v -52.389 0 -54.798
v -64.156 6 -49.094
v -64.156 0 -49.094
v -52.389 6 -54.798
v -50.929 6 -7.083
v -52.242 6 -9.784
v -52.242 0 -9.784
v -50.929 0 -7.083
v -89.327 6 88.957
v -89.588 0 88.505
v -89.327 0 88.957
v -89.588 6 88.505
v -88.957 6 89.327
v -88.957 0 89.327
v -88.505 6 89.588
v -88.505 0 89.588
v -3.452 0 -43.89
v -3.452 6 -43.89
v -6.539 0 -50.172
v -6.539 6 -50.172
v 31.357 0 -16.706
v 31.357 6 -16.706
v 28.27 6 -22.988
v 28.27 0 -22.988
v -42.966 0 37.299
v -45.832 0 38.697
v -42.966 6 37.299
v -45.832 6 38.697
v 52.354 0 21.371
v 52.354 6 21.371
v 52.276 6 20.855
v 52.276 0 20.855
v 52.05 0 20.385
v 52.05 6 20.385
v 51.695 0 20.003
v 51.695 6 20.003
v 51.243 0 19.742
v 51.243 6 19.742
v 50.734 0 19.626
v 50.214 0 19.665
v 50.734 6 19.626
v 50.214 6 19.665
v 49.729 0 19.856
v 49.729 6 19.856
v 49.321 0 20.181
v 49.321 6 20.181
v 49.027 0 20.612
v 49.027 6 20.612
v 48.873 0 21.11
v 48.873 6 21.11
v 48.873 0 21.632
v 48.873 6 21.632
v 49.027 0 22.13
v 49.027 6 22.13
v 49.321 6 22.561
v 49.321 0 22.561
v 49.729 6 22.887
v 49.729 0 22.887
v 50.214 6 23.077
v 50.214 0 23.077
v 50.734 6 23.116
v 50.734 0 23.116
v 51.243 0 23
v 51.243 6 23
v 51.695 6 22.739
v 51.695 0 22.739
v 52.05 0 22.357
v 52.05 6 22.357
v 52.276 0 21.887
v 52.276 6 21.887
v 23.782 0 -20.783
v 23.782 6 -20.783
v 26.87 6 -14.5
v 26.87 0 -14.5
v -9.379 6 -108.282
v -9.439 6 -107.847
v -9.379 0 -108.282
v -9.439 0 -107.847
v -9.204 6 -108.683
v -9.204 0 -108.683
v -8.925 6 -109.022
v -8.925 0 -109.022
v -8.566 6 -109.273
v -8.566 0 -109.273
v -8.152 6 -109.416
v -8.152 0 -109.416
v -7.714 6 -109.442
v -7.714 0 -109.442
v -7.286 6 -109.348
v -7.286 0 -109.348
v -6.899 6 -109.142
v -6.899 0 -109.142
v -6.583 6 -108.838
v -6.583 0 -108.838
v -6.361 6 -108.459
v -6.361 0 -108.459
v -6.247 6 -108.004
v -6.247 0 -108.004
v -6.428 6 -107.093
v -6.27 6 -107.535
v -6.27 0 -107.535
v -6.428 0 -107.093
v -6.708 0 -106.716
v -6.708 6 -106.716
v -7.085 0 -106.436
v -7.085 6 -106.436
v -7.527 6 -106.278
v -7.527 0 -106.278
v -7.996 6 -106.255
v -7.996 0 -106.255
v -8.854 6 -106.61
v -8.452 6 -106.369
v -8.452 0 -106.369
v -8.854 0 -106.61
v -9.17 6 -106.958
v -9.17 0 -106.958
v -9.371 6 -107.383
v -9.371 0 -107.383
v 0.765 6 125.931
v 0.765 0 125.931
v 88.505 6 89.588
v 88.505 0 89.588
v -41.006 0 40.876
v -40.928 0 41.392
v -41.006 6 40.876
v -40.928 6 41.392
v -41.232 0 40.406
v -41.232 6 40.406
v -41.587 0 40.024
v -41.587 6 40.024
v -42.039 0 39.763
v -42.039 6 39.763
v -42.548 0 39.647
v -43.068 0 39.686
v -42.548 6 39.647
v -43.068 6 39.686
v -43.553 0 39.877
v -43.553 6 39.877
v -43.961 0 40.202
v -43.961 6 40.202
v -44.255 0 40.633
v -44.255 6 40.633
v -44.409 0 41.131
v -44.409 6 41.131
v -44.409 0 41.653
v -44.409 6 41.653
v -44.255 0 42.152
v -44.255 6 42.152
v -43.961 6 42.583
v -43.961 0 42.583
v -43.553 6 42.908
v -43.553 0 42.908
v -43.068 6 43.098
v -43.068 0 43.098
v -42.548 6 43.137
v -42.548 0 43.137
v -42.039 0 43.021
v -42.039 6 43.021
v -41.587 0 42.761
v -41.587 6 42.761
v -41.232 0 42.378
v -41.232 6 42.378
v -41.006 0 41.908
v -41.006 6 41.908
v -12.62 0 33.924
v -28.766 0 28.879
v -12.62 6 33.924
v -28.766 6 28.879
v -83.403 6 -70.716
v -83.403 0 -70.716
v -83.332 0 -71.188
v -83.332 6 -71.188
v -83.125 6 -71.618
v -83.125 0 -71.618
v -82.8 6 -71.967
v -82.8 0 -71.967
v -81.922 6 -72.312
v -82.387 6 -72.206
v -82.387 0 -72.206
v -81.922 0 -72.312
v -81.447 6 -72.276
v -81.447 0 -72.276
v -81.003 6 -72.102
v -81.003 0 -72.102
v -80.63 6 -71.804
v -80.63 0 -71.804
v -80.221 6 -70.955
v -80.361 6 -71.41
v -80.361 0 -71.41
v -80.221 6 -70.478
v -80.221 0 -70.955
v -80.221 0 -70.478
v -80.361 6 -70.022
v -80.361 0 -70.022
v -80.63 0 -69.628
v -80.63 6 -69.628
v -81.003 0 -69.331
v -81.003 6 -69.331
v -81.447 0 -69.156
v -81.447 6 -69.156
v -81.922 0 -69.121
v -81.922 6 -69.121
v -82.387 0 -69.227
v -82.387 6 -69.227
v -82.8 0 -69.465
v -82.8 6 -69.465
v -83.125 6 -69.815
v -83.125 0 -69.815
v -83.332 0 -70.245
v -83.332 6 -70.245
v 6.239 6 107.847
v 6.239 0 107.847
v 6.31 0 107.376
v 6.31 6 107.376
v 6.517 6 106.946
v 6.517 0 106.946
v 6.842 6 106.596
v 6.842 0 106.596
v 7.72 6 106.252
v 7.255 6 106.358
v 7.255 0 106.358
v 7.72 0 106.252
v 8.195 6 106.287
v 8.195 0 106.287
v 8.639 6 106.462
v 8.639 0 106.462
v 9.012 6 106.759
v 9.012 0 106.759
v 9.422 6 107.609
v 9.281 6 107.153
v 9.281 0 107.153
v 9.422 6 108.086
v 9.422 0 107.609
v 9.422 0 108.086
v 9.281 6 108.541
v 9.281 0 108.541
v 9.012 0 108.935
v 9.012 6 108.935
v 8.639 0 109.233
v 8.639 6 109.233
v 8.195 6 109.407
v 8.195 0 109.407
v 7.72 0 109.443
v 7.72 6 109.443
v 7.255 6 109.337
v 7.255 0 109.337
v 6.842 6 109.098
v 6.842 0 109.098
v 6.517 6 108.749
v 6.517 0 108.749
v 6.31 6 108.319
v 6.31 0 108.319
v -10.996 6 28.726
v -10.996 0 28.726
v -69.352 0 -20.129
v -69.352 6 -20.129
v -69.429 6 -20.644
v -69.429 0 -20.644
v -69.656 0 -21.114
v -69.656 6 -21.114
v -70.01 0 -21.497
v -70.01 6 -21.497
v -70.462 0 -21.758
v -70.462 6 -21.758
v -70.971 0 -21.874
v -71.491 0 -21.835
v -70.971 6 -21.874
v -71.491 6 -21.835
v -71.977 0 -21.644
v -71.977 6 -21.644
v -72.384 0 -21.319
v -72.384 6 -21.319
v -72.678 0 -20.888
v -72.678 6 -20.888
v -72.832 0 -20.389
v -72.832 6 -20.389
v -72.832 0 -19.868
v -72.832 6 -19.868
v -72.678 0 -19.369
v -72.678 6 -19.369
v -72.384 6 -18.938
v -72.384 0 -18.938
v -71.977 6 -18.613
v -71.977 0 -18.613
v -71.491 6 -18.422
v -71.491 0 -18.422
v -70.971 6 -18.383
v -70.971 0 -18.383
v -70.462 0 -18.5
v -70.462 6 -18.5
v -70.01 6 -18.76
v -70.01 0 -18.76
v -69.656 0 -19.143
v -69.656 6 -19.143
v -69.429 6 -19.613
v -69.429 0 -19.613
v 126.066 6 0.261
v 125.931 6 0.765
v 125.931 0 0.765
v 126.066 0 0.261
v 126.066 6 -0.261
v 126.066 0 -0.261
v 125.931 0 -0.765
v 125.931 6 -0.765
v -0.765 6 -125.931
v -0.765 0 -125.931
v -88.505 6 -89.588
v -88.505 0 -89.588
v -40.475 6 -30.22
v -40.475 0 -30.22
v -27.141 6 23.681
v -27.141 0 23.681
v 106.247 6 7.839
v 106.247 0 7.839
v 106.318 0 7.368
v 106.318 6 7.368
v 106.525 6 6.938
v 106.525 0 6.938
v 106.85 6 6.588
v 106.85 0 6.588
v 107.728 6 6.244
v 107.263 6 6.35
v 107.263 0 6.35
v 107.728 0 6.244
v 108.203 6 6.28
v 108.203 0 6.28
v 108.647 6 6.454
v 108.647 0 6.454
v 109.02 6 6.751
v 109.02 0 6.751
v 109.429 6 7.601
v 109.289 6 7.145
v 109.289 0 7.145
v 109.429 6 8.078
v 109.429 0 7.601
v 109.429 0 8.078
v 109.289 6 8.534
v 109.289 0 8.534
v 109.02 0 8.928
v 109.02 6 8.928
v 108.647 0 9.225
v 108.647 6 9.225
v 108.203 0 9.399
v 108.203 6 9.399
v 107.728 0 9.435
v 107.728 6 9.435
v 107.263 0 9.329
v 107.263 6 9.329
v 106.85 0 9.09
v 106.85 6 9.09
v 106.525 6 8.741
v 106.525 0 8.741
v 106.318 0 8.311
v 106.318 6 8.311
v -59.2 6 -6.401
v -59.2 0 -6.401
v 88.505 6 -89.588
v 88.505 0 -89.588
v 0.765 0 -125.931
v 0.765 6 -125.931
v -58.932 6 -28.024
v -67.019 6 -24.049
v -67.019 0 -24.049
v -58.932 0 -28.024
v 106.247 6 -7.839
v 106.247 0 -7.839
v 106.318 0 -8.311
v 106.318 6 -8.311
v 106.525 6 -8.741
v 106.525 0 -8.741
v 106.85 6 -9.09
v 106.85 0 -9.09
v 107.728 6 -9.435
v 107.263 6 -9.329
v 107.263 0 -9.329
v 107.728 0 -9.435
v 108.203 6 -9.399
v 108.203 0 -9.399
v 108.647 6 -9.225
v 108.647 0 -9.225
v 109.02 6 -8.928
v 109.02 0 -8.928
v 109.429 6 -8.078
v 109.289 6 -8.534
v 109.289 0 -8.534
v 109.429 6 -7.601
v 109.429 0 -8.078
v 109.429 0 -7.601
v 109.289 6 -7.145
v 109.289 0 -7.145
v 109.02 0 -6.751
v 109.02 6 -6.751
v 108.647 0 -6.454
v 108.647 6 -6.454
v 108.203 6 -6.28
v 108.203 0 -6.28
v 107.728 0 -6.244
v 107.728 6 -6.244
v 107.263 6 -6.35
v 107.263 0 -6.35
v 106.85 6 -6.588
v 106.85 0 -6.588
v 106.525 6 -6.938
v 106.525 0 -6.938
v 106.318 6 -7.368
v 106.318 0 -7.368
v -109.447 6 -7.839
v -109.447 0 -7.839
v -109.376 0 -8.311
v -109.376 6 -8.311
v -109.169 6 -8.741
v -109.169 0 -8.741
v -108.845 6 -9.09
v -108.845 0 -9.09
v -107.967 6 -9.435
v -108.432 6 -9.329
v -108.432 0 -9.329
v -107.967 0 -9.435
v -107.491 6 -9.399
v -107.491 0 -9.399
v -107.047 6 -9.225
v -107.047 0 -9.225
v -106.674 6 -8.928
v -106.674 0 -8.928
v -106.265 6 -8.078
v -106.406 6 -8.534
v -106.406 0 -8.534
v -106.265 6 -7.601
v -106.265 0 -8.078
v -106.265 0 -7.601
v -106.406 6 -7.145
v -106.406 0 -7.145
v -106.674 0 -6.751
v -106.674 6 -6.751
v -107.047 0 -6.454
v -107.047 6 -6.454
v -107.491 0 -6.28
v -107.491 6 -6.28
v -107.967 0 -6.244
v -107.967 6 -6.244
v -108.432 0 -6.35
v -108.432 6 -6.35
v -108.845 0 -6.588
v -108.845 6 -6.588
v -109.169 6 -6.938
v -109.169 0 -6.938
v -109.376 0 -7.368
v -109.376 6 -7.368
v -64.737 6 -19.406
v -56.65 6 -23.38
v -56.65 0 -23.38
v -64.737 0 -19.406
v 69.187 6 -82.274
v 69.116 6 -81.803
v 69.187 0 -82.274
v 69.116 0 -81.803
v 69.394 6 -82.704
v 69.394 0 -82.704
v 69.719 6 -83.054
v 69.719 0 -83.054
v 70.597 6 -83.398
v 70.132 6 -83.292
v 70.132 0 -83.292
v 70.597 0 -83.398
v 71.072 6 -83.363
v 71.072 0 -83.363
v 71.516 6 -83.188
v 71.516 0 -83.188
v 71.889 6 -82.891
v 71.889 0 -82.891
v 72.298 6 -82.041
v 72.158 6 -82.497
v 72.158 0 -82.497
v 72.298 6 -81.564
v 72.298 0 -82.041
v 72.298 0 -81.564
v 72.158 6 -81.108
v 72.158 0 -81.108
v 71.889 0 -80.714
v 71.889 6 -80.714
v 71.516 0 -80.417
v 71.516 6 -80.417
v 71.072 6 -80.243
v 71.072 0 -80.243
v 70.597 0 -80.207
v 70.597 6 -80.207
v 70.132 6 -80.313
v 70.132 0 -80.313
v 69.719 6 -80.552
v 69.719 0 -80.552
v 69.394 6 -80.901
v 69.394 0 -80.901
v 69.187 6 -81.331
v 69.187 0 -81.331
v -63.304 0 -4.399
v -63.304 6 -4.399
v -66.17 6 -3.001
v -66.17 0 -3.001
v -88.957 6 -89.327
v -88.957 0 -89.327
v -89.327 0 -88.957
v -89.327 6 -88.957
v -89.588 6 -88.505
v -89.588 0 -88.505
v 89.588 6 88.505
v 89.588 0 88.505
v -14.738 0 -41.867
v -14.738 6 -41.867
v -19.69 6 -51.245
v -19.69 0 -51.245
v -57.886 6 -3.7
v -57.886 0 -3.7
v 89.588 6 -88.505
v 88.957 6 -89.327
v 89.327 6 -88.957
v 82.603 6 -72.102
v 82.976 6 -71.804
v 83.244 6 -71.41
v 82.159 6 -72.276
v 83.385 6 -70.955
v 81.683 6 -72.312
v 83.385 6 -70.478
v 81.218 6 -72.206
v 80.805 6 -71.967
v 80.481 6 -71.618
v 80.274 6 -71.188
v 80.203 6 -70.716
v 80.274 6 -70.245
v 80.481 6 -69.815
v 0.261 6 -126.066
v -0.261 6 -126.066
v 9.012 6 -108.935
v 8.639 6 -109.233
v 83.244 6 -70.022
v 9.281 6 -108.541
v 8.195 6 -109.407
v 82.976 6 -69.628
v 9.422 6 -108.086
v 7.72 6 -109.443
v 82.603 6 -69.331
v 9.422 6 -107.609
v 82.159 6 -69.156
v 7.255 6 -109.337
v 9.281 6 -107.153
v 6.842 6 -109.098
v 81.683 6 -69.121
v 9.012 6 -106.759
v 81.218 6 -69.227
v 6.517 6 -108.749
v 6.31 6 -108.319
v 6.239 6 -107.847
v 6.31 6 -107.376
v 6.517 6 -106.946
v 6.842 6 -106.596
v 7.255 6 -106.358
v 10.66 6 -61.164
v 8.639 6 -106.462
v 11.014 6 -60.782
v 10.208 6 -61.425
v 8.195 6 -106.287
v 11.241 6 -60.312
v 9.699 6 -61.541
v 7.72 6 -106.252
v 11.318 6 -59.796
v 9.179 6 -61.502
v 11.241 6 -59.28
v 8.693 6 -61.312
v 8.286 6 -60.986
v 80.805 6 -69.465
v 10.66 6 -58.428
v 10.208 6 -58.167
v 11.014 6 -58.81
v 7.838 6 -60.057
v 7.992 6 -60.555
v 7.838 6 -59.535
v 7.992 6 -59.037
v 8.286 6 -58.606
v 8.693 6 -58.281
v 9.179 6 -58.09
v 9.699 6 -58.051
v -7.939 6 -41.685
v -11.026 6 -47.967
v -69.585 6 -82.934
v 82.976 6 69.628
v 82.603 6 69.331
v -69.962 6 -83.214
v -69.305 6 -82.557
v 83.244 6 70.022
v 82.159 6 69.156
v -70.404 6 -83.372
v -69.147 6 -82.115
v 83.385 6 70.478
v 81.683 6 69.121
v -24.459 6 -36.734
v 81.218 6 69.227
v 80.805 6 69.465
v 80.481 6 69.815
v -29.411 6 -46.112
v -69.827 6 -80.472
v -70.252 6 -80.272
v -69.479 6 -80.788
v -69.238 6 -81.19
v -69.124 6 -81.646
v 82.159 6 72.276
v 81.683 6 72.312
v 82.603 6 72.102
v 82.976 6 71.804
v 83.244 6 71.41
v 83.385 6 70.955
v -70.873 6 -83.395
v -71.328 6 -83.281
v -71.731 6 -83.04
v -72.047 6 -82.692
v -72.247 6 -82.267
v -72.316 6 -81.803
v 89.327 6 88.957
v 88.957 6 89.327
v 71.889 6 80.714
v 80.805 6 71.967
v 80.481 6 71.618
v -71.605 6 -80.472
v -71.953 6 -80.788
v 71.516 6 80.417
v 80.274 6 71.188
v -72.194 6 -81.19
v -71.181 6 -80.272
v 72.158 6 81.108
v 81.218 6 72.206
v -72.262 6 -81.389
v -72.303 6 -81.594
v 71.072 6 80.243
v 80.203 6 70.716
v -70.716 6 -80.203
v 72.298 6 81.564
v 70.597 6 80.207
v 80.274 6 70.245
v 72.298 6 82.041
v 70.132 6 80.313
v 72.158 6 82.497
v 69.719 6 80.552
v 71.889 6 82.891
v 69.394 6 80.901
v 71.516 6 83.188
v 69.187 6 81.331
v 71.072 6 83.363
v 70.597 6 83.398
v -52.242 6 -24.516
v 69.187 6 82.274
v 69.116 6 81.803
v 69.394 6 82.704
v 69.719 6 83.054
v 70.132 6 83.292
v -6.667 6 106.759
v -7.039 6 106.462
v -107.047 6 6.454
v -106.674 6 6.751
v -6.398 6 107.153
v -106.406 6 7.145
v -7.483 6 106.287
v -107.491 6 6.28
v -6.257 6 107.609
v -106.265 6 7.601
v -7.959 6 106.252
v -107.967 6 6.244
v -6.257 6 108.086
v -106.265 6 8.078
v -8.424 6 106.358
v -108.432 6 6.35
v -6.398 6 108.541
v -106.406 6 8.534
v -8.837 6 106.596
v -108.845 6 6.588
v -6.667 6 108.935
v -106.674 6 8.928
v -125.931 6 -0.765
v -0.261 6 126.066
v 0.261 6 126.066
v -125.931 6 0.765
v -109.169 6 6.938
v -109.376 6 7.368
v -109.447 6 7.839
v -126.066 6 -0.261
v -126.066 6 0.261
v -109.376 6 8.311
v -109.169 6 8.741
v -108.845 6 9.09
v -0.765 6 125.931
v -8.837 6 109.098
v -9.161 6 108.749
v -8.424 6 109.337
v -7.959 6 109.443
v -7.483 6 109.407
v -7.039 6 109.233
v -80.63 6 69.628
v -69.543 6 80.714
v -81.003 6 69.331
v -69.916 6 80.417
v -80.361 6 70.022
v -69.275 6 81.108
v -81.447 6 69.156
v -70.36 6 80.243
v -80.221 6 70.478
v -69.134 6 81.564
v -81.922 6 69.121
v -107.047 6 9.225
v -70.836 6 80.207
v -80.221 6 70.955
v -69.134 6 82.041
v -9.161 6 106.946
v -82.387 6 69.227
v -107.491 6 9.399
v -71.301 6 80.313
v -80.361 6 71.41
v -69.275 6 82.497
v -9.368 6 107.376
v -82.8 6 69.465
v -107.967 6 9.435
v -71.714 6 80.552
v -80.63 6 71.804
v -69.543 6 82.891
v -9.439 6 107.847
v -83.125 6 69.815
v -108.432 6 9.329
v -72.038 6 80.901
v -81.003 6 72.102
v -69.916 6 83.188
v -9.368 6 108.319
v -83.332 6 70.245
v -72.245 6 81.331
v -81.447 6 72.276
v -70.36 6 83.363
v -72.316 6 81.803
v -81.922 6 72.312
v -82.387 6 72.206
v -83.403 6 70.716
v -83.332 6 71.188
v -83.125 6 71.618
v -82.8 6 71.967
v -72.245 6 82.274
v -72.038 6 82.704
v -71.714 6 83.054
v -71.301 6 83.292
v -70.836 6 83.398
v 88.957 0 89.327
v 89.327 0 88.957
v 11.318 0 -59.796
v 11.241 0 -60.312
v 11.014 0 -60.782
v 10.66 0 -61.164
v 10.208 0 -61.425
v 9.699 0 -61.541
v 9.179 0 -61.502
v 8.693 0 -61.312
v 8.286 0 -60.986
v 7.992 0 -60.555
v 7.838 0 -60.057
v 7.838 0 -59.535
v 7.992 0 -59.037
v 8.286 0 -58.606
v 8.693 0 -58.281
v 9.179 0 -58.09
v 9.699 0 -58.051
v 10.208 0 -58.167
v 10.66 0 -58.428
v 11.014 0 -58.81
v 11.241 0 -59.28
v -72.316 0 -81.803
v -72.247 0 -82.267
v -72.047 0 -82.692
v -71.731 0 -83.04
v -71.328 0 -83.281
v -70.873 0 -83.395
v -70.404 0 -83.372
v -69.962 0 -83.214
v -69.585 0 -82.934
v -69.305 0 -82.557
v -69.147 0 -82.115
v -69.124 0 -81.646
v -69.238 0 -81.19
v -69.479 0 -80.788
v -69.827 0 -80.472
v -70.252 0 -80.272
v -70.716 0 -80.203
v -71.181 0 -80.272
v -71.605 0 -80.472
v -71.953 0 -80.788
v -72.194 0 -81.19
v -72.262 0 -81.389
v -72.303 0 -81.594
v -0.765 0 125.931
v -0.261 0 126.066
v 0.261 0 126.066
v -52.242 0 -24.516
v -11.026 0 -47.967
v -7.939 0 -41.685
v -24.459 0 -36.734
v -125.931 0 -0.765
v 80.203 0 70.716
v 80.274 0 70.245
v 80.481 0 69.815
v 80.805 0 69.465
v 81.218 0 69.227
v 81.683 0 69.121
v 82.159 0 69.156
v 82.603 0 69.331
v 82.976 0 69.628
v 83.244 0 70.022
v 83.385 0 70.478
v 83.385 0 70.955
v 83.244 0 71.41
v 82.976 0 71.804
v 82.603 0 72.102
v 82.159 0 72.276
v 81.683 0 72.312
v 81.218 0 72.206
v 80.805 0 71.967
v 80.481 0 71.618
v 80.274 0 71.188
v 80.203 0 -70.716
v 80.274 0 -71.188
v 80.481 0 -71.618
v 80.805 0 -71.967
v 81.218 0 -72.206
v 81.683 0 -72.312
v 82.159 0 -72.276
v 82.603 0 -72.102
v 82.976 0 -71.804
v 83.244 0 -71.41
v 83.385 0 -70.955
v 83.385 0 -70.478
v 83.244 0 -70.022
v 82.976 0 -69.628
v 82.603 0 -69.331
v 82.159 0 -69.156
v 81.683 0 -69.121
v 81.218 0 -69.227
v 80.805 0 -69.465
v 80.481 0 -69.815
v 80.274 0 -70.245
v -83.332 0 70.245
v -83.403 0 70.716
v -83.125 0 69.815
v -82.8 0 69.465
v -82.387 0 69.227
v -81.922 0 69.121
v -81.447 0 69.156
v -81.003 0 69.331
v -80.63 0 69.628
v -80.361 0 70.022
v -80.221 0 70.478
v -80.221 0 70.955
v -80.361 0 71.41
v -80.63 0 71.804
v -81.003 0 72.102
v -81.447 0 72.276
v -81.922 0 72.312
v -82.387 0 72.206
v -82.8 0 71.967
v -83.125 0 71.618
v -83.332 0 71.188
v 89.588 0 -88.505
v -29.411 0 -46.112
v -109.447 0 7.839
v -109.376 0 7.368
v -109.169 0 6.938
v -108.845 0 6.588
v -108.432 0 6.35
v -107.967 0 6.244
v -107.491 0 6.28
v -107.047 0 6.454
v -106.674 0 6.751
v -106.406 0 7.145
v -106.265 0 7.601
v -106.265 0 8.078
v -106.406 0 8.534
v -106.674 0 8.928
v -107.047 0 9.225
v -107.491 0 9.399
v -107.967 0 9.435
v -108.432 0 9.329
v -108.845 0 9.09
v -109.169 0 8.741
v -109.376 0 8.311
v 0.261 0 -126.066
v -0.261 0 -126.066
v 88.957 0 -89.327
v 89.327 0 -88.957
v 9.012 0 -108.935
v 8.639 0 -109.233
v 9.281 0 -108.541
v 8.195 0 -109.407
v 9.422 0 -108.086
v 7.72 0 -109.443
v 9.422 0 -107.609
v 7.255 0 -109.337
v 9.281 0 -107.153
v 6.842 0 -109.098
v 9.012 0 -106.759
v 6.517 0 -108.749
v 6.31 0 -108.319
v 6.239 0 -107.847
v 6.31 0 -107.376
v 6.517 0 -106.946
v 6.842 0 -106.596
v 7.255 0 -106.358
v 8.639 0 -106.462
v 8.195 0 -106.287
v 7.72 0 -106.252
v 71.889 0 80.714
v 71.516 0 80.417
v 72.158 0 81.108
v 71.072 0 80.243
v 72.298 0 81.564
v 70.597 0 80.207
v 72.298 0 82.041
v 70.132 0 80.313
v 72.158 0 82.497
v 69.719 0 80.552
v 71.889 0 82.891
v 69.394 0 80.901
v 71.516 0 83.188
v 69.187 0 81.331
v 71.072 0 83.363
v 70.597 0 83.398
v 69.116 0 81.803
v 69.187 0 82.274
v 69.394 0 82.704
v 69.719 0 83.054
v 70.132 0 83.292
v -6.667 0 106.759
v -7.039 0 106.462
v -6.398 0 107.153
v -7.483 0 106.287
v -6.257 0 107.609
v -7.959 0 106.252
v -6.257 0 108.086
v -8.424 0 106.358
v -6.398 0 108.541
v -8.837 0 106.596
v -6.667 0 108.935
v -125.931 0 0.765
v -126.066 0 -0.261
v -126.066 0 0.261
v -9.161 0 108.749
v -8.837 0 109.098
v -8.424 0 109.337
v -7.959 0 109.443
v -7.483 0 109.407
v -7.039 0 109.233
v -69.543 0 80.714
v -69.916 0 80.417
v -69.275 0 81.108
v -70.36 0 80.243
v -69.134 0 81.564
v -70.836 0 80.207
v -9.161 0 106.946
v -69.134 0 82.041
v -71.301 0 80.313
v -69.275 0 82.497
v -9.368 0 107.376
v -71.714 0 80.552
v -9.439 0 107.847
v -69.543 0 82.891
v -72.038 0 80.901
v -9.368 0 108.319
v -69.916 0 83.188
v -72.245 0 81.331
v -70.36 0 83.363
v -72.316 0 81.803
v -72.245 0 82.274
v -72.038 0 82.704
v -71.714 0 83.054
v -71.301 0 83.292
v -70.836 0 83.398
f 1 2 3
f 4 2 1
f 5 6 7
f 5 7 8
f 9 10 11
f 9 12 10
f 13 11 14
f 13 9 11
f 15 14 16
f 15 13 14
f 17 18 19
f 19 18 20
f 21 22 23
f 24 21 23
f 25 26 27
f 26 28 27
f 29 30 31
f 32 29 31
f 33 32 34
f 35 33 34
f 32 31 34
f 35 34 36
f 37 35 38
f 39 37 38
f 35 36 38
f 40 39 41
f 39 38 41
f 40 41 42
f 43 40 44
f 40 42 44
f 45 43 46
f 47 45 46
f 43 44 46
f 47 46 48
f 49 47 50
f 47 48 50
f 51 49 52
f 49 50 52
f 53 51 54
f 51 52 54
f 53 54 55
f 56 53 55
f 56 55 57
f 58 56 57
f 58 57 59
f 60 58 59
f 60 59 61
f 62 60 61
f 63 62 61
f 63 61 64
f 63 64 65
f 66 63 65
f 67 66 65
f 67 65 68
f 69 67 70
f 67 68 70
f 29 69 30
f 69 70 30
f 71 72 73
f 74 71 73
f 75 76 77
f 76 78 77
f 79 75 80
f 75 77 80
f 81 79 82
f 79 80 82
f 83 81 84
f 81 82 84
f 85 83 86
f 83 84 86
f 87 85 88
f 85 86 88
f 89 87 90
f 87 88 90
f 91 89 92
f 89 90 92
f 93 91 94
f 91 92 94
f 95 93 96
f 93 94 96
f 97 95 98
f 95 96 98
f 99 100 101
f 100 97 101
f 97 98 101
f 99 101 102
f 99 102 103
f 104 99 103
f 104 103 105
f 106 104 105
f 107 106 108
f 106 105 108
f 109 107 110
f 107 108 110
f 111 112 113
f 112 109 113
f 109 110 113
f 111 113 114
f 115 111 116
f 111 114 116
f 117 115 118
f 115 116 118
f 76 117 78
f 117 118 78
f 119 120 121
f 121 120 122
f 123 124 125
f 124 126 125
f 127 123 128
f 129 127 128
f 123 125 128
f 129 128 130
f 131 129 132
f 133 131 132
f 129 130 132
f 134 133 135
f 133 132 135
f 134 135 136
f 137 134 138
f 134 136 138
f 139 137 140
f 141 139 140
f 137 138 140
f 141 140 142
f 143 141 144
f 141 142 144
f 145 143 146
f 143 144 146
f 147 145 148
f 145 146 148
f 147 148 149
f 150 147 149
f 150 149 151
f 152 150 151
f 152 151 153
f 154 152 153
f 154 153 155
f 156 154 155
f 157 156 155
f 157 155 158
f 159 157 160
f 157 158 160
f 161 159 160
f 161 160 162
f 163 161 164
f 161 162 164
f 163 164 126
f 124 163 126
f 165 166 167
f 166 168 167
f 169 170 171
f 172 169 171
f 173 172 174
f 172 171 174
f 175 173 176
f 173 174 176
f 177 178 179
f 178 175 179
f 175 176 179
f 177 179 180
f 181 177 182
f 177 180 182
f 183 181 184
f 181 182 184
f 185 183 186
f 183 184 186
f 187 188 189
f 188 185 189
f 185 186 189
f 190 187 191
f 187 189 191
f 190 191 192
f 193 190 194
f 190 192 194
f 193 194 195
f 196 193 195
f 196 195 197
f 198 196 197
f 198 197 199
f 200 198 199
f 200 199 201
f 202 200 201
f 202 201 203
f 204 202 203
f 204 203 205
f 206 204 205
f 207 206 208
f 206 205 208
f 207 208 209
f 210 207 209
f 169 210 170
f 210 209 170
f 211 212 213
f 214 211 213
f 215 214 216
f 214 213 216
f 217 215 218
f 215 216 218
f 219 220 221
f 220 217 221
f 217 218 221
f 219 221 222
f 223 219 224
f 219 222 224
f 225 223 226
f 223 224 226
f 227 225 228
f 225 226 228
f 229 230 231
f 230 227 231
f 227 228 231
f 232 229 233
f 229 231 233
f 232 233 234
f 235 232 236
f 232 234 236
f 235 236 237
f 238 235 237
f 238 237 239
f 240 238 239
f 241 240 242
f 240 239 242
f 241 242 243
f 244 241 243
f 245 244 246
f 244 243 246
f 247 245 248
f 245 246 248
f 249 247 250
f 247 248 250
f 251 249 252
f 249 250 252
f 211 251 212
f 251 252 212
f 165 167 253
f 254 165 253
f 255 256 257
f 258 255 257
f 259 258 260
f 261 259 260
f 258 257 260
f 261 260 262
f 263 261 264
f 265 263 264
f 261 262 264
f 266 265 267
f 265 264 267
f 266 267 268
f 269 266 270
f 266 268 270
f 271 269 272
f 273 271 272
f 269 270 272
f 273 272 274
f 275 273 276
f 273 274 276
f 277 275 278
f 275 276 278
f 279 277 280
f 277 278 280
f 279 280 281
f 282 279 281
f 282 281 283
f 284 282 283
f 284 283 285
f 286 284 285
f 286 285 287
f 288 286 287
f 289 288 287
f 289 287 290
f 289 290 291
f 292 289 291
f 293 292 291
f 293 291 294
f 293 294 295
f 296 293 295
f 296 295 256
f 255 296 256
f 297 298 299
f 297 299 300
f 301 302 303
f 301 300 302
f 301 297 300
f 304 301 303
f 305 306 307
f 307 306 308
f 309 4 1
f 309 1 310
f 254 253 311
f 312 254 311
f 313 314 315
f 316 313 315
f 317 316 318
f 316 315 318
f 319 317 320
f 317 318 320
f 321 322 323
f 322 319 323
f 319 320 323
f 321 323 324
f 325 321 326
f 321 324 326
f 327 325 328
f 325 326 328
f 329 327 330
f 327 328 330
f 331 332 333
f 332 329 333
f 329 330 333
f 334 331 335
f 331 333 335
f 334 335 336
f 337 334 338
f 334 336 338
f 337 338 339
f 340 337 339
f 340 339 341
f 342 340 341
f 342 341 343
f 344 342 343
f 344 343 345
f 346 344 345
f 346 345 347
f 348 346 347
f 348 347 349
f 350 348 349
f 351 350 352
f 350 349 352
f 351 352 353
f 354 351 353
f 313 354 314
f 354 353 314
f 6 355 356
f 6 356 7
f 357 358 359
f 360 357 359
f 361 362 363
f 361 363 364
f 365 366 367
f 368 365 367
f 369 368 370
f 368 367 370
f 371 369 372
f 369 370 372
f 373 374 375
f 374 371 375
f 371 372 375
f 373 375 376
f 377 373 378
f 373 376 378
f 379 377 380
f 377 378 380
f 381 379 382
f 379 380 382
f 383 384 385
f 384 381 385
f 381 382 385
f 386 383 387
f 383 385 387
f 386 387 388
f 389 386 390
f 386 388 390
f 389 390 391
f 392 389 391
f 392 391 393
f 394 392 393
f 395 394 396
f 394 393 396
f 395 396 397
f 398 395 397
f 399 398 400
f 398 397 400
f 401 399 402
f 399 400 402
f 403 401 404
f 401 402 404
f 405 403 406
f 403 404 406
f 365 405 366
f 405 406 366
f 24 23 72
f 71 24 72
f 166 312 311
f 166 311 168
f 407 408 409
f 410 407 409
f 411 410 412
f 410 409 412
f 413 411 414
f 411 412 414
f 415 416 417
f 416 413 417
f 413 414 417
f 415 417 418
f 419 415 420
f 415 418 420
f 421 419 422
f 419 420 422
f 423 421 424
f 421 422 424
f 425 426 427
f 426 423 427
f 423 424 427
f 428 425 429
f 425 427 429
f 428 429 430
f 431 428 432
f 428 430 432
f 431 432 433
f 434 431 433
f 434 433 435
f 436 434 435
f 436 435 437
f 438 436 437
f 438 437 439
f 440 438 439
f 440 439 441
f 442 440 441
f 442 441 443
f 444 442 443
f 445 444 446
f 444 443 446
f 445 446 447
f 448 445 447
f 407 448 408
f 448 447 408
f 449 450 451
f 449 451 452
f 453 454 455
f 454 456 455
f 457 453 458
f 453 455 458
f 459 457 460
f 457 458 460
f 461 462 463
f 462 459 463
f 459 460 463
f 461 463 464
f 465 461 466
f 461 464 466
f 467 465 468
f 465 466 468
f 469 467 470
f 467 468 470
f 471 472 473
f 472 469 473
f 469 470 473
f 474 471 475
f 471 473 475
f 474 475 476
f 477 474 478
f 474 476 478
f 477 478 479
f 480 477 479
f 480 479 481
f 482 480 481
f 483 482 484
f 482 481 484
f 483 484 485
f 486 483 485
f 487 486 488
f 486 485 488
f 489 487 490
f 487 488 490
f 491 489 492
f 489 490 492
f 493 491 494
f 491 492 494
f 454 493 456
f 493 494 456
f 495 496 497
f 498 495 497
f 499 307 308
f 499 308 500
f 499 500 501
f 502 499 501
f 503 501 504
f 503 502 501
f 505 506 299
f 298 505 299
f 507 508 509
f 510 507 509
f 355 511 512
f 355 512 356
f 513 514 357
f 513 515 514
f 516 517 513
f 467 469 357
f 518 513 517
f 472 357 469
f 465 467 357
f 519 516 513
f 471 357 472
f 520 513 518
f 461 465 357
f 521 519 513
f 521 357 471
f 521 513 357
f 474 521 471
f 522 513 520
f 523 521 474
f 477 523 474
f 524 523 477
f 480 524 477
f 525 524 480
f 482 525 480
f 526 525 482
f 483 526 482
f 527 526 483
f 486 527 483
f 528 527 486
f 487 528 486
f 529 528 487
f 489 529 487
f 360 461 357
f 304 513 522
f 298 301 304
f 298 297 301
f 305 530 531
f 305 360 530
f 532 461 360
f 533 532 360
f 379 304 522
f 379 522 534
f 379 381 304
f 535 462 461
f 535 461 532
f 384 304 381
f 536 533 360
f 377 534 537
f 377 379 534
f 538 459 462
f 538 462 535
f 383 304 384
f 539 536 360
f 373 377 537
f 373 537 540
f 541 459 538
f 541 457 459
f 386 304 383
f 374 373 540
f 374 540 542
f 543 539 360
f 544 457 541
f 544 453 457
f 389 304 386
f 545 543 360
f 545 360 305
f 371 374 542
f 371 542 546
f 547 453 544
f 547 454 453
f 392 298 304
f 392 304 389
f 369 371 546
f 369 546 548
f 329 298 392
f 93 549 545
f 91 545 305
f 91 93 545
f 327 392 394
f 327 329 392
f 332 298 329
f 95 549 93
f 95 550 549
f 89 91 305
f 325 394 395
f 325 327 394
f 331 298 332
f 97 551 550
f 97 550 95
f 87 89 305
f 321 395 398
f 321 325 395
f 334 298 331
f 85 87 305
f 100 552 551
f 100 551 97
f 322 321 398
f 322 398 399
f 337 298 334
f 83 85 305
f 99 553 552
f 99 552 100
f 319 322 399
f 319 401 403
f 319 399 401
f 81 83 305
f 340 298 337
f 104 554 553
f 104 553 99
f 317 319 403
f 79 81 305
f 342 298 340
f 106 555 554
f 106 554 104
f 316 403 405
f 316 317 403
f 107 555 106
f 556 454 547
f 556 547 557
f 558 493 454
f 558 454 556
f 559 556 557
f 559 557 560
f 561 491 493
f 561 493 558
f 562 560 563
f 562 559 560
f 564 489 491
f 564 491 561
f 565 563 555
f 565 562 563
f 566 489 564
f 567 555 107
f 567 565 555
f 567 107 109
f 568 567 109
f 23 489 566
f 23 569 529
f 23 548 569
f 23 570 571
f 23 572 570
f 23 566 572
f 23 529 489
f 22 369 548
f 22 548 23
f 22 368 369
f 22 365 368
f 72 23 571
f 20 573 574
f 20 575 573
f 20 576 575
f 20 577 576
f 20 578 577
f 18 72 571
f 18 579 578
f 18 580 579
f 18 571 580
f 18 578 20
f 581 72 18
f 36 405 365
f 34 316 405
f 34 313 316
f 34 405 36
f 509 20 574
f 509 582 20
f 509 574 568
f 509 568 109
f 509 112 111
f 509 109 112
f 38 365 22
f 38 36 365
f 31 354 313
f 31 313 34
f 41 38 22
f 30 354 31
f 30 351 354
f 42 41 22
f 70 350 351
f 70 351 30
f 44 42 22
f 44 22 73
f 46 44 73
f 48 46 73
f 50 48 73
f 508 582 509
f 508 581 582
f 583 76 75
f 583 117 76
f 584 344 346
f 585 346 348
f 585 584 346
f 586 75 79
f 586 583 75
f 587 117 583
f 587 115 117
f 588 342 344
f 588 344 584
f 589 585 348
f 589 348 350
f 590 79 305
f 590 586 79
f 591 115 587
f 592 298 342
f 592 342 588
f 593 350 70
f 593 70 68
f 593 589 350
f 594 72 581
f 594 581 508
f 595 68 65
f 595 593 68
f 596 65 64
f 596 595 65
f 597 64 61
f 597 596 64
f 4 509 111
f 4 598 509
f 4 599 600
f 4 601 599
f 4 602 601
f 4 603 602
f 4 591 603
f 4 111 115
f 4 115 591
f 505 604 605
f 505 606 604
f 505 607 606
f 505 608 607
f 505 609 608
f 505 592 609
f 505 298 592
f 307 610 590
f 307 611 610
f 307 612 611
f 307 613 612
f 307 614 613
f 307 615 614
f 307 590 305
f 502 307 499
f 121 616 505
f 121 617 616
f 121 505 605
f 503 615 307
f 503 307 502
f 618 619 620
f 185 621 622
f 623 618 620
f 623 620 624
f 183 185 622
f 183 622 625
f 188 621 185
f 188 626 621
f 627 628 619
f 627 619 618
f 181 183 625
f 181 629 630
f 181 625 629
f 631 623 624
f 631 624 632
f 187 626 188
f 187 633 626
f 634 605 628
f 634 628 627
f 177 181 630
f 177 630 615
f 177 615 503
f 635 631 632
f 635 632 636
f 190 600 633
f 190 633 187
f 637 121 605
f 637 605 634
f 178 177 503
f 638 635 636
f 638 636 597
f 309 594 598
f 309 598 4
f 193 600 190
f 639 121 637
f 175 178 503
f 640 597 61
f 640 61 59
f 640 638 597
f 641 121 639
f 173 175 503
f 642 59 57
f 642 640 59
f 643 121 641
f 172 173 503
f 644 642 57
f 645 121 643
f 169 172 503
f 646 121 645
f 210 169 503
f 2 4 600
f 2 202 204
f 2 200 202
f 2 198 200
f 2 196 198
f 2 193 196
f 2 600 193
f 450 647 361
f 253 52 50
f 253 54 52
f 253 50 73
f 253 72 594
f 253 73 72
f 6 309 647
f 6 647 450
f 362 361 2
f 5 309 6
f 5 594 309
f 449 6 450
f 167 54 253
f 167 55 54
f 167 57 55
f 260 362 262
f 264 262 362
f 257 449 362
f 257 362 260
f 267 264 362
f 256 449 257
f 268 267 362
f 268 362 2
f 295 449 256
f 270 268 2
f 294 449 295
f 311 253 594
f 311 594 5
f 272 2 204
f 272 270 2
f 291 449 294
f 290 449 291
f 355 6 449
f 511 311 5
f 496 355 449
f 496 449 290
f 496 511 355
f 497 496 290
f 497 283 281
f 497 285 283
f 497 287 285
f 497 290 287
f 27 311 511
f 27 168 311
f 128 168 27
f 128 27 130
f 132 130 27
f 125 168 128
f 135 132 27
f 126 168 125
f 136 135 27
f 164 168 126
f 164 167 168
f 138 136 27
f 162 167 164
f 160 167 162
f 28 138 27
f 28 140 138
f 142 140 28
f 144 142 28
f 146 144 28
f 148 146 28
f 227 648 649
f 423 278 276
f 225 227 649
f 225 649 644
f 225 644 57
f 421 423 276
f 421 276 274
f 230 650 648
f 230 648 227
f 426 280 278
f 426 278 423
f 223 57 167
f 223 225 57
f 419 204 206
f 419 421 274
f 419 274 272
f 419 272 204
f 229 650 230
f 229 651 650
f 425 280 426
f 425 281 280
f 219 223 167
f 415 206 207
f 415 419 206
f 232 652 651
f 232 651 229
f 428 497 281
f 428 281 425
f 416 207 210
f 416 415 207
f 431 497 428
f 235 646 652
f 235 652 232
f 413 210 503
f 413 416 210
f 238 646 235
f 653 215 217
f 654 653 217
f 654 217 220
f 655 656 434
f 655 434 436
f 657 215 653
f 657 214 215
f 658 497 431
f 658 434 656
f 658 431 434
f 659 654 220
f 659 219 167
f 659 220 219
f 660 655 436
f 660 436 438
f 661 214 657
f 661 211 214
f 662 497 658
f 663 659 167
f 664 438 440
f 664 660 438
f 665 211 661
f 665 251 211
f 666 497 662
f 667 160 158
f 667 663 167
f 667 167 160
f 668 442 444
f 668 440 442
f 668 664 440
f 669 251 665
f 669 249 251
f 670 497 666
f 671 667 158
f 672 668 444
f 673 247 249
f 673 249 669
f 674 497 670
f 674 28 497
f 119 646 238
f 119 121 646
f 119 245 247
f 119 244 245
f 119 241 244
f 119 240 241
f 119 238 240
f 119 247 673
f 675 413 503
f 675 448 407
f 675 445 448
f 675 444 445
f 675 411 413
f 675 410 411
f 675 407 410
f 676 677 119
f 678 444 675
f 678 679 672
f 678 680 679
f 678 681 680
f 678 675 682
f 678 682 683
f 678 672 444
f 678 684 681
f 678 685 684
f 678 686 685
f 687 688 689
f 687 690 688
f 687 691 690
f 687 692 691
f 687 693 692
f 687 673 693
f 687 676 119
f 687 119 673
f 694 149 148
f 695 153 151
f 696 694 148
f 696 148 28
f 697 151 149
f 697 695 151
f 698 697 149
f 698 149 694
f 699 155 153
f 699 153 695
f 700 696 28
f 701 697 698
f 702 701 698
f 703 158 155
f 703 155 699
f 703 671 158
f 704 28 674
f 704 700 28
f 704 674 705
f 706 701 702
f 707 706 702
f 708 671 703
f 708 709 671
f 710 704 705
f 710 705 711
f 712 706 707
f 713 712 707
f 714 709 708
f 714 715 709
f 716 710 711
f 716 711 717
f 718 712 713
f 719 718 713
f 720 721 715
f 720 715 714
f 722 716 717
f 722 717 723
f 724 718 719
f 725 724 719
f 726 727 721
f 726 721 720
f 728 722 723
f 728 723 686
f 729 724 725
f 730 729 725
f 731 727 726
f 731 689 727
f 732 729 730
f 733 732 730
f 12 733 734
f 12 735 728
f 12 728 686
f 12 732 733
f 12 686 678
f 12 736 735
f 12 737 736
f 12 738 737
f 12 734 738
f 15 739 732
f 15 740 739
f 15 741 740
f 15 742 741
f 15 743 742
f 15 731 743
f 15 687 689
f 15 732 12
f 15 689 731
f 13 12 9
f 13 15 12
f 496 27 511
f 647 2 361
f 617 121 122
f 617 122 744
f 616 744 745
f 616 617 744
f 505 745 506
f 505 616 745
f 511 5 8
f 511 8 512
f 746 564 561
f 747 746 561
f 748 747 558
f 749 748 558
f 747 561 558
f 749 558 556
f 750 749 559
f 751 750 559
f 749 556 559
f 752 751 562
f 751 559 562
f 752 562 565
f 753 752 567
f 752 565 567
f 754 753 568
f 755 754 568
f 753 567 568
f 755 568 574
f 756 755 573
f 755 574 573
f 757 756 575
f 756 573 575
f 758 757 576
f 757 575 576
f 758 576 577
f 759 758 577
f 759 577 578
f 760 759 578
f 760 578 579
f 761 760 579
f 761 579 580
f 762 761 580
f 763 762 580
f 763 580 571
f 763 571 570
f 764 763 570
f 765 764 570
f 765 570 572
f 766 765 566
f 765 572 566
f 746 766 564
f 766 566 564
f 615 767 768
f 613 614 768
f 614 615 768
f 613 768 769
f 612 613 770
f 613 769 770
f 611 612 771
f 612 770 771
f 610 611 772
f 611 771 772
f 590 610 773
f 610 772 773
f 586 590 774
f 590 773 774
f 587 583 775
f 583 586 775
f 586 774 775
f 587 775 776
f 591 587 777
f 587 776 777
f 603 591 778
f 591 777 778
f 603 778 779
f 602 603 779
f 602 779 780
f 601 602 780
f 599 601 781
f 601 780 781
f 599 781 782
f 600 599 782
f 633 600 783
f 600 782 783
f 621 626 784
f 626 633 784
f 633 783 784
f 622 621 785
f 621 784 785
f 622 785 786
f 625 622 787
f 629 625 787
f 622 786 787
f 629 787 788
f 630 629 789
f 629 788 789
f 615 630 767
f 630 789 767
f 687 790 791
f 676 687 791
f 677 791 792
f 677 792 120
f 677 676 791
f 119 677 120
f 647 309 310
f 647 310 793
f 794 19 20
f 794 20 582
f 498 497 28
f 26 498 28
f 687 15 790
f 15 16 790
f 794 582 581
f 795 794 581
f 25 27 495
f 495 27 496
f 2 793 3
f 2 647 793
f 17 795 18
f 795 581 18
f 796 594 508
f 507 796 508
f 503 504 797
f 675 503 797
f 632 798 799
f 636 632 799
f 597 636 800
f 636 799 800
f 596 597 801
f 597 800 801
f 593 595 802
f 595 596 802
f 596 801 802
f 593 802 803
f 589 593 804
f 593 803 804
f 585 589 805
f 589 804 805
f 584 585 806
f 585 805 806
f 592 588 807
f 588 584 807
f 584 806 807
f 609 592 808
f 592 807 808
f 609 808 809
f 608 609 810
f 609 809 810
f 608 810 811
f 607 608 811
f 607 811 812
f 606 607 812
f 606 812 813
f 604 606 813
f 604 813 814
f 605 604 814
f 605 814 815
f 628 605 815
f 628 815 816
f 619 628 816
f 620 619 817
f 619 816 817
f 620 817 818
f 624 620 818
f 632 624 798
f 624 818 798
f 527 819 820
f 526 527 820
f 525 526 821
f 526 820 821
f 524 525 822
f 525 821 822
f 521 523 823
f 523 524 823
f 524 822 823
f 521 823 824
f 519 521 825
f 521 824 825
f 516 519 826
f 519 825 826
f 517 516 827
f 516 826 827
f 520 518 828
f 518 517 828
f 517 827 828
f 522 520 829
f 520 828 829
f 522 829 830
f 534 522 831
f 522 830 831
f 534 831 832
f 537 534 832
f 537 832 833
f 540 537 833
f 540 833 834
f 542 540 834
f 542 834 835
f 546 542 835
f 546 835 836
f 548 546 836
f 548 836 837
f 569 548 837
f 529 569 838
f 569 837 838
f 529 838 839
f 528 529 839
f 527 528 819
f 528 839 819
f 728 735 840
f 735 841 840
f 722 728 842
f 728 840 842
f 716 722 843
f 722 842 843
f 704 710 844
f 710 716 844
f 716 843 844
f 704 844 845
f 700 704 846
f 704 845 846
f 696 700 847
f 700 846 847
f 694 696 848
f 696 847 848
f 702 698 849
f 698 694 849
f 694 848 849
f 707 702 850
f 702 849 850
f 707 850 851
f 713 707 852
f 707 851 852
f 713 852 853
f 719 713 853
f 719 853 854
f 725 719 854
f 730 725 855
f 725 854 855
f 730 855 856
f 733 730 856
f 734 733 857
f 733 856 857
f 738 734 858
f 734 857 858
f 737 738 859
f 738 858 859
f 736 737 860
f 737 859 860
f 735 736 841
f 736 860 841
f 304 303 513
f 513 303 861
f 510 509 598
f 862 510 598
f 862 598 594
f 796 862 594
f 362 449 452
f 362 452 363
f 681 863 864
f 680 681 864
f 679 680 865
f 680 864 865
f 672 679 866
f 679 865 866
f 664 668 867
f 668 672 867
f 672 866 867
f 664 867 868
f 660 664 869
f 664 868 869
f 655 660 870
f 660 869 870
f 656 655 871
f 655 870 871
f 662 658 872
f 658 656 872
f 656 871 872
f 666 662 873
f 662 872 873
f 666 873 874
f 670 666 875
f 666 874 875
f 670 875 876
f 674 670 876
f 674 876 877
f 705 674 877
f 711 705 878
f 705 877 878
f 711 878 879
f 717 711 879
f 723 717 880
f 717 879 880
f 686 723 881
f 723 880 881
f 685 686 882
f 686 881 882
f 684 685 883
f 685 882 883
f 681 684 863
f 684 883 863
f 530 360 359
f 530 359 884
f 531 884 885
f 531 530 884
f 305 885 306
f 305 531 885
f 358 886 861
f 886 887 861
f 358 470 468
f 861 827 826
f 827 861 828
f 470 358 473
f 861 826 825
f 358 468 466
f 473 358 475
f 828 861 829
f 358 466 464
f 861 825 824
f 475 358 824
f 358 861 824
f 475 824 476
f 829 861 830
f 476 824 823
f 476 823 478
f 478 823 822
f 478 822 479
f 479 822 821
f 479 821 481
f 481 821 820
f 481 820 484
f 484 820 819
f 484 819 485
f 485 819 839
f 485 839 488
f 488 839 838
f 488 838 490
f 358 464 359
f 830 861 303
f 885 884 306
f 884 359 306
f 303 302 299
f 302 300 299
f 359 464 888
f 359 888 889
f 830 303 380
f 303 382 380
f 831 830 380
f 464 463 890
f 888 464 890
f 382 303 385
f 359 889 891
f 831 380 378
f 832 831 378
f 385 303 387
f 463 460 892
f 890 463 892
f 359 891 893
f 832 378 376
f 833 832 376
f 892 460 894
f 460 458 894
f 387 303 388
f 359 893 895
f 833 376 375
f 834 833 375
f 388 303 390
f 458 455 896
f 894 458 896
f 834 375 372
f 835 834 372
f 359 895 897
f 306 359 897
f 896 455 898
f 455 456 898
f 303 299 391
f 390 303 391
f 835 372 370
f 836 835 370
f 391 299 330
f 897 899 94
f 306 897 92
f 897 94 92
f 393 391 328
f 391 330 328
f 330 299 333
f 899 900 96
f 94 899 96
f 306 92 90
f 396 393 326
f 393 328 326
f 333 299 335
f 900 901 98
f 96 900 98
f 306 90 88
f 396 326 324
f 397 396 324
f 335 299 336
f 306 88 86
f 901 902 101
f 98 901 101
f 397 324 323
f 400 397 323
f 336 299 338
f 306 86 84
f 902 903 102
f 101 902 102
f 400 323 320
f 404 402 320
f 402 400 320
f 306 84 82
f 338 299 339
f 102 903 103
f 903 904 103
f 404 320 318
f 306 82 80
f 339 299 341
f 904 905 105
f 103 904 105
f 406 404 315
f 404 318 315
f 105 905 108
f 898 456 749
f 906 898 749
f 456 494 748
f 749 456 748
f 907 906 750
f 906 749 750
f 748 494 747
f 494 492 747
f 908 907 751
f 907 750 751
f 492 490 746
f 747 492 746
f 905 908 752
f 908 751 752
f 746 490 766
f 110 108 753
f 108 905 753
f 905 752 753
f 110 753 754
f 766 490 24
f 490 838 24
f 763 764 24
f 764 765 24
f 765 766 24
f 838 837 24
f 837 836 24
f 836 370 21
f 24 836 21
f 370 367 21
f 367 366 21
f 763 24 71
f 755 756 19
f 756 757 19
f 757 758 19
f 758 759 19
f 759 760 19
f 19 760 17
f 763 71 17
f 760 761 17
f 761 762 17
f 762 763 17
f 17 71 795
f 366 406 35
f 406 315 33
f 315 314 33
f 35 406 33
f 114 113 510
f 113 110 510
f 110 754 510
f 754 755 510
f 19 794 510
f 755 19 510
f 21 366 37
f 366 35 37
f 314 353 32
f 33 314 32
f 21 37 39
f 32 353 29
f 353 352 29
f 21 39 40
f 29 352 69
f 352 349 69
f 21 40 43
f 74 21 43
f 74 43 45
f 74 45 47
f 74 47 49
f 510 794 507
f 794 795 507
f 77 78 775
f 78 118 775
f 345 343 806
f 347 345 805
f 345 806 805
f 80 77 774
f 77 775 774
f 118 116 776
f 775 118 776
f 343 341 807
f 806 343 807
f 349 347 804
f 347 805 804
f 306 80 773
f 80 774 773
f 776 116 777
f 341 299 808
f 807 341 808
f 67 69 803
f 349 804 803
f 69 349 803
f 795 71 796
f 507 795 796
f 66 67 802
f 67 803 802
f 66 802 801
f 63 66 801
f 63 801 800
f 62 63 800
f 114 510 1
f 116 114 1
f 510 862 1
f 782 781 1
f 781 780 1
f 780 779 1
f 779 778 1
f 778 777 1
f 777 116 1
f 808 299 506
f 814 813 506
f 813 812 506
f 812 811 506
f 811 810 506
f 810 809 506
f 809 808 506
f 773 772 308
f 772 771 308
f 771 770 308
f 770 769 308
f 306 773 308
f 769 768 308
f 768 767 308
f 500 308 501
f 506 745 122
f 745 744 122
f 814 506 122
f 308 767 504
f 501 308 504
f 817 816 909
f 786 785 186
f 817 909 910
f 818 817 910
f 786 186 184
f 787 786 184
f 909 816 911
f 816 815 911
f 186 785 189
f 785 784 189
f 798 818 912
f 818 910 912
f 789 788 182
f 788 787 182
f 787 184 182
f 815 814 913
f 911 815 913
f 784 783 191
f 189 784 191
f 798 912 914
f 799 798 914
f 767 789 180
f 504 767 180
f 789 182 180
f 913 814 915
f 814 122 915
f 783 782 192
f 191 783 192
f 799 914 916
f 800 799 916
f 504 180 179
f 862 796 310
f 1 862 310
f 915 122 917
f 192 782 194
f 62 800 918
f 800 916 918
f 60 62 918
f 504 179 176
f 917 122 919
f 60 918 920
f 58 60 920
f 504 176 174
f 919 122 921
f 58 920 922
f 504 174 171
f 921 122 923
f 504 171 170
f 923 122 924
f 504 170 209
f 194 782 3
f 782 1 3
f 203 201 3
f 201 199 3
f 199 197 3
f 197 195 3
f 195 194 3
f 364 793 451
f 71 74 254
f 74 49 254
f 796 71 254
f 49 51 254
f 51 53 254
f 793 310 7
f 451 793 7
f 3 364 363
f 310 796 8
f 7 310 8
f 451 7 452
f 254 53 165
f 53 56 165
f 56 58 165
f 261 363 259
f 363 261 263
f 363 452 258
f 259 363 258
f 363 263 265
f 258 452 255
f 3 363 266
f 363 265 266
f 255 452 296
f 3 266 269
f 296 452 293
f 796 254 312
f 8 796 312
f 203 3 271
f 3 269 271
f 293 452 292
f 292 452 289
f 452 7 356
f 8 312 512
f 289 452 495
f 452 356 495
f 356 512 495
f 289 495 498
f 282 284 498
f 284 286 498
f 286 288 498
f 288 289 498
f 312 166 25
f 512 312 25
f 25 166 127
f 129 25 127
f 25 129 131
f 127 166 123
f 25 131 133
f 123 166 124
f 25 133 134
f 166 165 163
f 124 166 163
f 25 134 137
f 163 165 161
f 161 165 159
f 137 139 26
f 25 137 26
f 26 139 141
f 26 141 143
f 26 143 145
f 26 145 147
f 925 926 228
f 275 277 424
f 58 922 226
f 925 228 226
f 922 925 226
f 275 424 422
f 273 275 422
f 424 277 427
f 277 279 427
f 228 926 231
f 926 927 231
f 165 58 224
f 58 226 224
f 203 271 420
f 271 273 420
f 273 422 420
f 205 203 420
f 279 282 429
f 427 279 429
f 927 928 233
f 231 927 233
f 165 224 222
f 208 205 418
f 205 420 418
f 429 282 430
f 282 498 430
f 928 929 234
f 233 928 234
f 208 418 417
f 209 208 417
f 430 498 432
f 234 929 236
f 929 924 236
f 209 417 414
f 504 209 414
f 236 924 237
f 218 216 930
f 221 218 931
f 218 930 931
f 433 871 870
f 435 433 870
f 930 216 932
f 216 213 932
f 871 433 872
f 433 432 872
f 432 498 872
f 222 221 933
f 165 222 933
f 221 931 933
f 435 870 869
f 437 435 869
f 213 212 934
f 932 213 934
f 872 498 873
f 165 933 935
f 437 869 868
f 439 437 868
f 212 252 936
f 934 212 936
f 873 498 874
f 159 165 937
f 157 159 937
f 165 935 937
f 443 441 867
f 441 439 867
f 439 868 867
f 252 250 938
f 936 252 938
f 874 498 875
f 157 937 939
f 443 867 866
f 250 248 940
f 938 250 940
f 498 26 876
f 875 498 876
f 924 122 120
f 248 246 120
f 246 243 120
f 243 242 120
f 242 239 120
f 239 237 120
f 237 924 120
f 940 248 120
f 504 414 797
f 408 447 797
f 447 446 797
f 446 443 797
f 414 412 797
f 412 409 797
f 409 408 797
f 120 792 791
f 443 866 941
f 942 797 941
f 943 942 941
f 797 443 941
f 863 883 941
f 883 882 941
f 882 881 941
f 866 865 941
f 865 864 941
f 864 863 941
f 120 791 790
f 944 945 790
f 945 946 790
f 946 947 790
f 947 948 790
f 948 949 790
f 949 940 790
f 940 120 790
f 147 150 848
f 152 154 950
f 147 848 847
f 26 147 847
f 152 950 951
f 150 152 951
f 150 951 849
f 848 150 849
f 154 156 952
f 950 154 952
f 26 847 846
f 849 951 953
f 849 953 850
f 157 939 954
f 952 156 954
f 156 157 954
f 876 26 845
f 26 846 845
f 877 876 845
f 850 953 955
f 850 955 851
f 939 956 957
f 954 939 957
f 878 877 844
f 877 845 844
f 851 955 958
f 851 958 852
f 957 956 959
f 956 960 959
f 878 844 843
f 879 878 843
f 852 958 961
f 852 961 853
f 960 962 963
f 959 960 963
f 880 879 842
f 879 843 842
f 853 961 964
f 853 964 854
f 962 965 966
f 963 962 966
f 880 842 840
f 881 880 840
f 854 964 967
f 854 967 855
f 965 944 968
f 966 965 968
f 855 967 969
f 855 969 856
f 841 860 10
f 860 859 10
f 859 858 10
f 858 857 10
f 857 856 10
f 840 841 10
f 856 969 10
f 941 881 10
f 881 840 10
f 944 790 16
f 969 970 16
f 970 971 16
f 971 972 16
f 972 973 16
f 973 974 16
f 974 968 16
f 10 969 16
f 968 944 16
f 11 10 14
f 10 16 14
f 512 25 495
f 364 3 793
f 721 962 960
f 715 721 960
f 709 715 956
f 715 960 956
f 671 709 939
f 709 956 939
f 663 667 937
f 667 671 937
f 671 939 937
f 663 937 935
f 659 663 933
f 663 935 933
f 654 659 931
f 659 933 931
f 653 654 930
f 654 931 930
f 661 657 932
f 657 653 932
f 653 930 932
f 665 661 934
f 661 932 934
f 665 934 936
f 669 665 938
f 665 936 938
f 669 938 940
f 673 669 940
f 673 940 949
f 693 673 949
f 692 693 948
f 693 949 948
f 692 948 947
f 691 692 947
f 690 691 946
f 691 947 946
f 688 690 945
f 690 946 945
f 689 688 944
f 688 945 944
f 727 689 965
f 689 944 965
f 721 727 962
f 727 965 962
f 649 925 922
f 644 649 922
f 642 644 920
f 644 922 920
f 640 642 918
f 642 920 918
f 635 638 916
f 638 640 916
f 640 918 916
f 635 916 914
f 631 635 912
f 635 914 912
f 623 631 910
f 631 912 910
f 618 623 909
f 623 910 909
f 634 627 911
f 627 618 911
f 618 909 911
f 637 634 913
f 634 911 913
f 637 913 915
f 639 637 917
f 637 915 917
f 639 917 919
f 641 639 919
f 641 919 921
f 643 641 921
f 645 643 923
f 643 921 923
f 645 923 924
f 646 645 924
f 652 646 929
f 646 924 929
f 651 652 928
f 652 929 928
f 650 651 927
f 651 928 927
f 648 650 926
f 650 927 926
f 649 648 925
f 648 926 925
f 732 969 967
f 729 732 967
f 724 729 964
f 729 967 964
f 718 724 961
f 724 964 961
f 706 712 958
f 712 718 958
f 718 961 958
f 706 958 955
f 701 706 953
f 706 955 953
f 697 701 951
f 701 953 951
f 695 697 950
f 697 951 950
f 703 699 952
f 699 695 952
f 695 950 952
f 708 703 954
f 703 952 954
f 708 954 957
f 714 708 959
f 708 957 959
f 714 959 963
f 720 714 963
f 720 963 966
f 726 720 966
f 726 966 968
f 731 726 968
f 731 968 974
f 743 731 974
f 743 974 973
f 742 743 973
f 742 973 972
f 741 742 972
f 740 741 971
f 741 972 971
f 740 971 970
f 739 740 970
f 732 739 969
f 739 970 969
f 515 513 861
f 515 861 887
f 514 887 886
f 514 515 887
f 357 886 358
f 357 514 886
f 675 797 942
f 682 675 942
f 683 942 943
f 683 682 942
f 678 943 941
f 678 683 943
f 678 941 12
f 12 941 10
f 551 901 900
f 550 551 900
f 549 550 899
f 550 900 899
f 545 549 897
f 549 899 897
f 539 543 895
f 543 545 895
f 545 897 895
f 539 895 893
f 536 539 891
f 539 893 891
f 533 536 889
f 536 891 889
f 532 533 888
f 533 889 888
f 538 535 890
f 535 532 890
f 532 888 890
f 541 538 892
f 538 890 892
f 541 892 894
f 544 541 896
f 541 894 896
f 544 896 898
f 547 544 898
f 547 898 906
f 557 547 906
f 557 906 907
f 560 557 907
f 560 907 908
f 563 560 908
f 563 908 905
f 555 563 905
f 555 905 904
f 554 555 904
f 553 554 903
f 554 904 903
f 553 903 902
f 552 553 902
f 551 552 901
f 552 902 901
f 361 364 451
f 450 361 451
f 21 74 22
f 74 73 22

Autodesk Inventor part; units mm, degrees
ref_plane "YZ Plane" through (0, 0, 0) normal (1, 0, 0) x (0, 1, 0)
ref_plane "XZ Plane" through (0, 0, 0) normal (0, 1, 0) x (-1, 0, 0)
ref_plane "XY Plane" through (0, 0, 0) normal (0, 0, 1) x (1, 0, 0)
sketch "Sketch1" plane through (0, 0, 0) normal (0, 1, 0) x (-1, 0, 0)
  line L0 (0, 0) -> (0, -104.6)
  line L1 (0, -104.6) -> (-73.9634, -73.9634)
  line L2 (-73.9634, -73.9634) -> (-104.6, 0)
  line L3 (-104.6, 0) -> (-73.9634, 73.9634)
  line L4 (-73.9634, 73.9634) -> (0, 104.6)
  line L5 (0, 104.6) -> (73.9634, 73.9634)
  line L6 (73.9634, 73.9634) -> (104.6, 0)
  line L7 (104.6, 0) -> (73.9634, -73.9634)
  line L8 (73.9634, -73.9634) -> (0, -104.6)
  line L9 (89.2707, -89.2707) -> (126.2478, 0)
  line L10 (126.2478, 0) -> (89.2707, 89.2707)
  line L11 (89.2707, 89.2707) -> (0, 126.2478)
  line L12 (0, 126.2478) -> (-89.2707, 89.2707)
  line L13 (-89.2707, 89.2707) -> (-126.2478, 0)
  line L14 (-126.2478, 0) -> (-89.2707, -89.2707)
  line L15 (-89.2707, -89.2707) -> (0, -126.2478)
  line L16 (0, -126.2478) -> (89.2707, -89.2707)
  line L17 (0, -104.6) -> (7.6537, -123.0776)
  line L18 (0, -104.6) -> (20, -104.6) construction
  line L19 (73.9634, -73.9634) -> (81.617, -92.441)
  line L20 (73.9634, -73.9634) -> (76.2595, -79.5066)
  line L21 (76.2595, -79.5066) -> (70.7162, -81.8027)
  circle A0 centre (70.7162, -81.8027) radius 1.6
  line L22 (0, -104.6) -> (2.2961, -110.1433)
  line L23 (2.2961, -110.1433) -> (7.8394, -107.8472)
  circle A1 centre (7.8394, -107.8472) radius 1.6
  circle A2 centre (107.8472, -7.8394) radius 1.6
  circle A3 centre (81.8027, -70.7162) radius 1.6
  circle A4 centre (81.8027, 70.7162) radius 1.6
  circle A5 centre (107.8472, 7.8394) radius 1.6
  circle A6 centre (7.8394, 107.8472) radius 1.6
  circle A7 centre (70.7162, 81.8027) radius 1.6
  circle A8 centre (-70.7162, 81.8027) radius 1.6
  circle A9 centre (-7.8394, 107.8472) radius 1.6
  circle A10 centre (-107.8472, 7.8394) radius 1.6
  circle A11 centre (-81.8027, 70.7162) radius 1.6
  circle A12 centre (-81.8027, -70.7162) radius 1.6
  circle A13 centre (-107.8472, -7.8394) radius 1.6
  circle A14 centre (-7.8394, -107.8472) radius 1.6
  circle A15 centre (-70.7162, -81.8027) radius 1.6
  dimension "d0" = 104.6
  dimension "d1" = 20
  dimension "d2" = 67.5
  dimension "d3" = 6
  dimension "d4" = 6
  dimension "d5" = 3.2
  dimension "d6" = 6
  dimension "d7" = 3.2
  dimension "d10" = 360
extrude "Extrusion1" add sketch "Sketch1" along normal blind 6
sketch "Sketch2" plane through (0, 6, 0) normal (0, 1, 0) x (1, 0, 0)
  circle A0 centre (-42.6783, -41.3923) radius 1.25 projected
  circle A1 centre (-71.1016, 20.1286) radius 1.25 projected
  circle A2 centre (9.5684, 59.7961) radius 1.25 projected
  circle A3 centre (50.6037, -21.3711) radius 1.25 projected
  line L0 (27.326, 15.8388) -> (30.0184, 17.162) projected
  line L1 (30.0184, 17.162) -> (27.8131, 21.6494) projected
  line L2 (-6.9954, 48.8338) -> (-9.6878, 47.5107) projected
  line L3 (-9.6878, 47.5107) -> (-7.4825, 43.0233) projected
  line L4 (25.1207, 20.3262) -> (27.326, 15.8388) projected
  line L5 (27.8131, 21.6494) -> (25.1207, 20.3262) projected
  line L6 (-7.4825, 43.0233) -> (-4.7901, 44.3464) projected
  line L7 (-4.7901, 44.3464) -> (-6.9954, 48.8338) projected
  line L8 (-12.62, -33.9245) -> (-10.9955, -28.7261)
  line L9 (-10.9955, -28.7261) -> (-27.141, -23.6807)
  line L10 (-27.141, -23.6807) -> (-28.7655, -28.879)
  line L11 (-28.7655, -28.879) -> (-12.62, -33.9245)
  line L12 (-12.62, -33.9245) -> (-27.141, -23.6807) construction
  line L13 (-10.9955, -28.7261) -> (-28.7655, -28.879) construction
  line L14 (-45.832, -38.6971) -> (-42.9662, -37.2994)
  line L15 (-42.9662, -37.2994) -> (-63.3038, 4.3989)
  line L16 (-63.3038, 4.3989) -> (-66.1696, 3.0011)
  line L17 (-66.1696, 3.0011) -> (-45.832, -38.6971)
  line L18 (-45.832, -38.6971) -> (-63.3038, 4.3989) construction
  line L19 (-42.9662, -37.2994) -> (-66.1696, 3.0011) construction
  line L20 (-45.832, -38.6971) -> (-42.6435, -38.6971) construction
  line L21 (-57.8864, 3.7) -> (-59.1996, 6.4006)
  line L22 (-59.1996, 6.4006) -> (-52.2421, 9.7838)
  line L23 (-52.2421, 9.7838) -> (-50.9289, 7.0832)
  line L24 (-50.9289, 7.0832) -> (-57.8864, 3.7)
  line L25 (-64.7367, 19.4057) -> (-67.0188, 24.0494)
  line L26 (-67.0188, 24.0494) -> (-58.9321, 28.0235)
  line L27 (-58.9321, 28.0235) -> (-56.65, 23.3798)
  line L28 (-56.65, 23.3798) -> (-64.7367, 19.4057)
  line L29 (-52.2421, 24.5164) -> (-64.1558, 49.0938)
  line L30 (-64.1558, 49.0938) -> (-52.3886, 54.7979)
  line L31 (-52.3886, 54.7979) -> (-40.4749, 30.2205)
  line L32 (-40.4749, 30.2205) -> (-52.2421, 24.5164)
  line L33 (-29.4108, 46.112) -> (-24.4587, 36.7338)
  line L34 (-24.4587, 36.7338) -> (-14.7376, 41.867)
  line L35 (-14.7376, 41.867) -> (-19.6897, 51.2451)
  line L36 (-19.6897, 51.2451) -> (-29.4108, 46.112)
  circle A4 centre (9.5684, 59.7961) radius 1.75
  circle A5 centre (50.6037, -21.3711) radius 1.75
  circle A6 centre (-42.6783, -41.3923) radius 1.75
  circle A7 centre (-71.1016, 20.1286) radius 1.75
  line L37 (26.8696, 14.5003) -> (31.357, 16.7056)
  line L38 (31.357, 16.7056) -> (28.2696, 22.9879)
  line L39 (28.2696, 22.9879) -> (23.7822, 20.7827)
  line L40 (23.7822, 20.7827) -> (26.8696, 14.5003)
  line L41 (-6.539, 50.1724) -> (-11.0263, 47.9671)
  line L42 (-11.0263, 47.9671) -> (-7.9389, 41.6847)
  line L43 (-7.9389, 41.6847) -> (-3.4516, 43.89)
  line L44 (-3.4516, 43.89) -> (-6.539, 50.1724)
  point P0 (0, 0)
  point P1 (-19.8805, -28.8026)
  point P2 (-54.5679, -17.1491)
  dimension "d14" = 26
  dimension "d15" = 0.5
  dimension "d16" = 0.5
  dimension "d17" = 0.5
  dimension "d18" = 0.5
  dimension "d19" = 1
  dimension "d20" = 1
extrude "Extrusion2" cut sketch "Sketch2" against normal blind 7 contours A0 | A1 | A2 | A3 | L4 L5 L1 L0 | L7 L6 L3 L2 | L11 L10 L9 L8 | L17 L16 L15 L14 | L21 L22 L23 L24 | L25 L26 L27 L28 | L29 L30 L31 L32 | L36 L35 L34 L33 | A4 | A5 | A6 | A7 | L40 L39 L38 L37 | L44 L43 L42 L41
fillet "Fillet1" radius 2 8 edges at (89.2707, 3, 89.2707) (126.2478, 3, 0) (89.2707, 3, -89.2707) (0, 3, -126.2478) (-89.2707, 3, -89.2707) (-126.2478, 3, 0) (-89.2707, 3, 89.2707) (0, 3, 126.2478)
properties part number "Bund"
